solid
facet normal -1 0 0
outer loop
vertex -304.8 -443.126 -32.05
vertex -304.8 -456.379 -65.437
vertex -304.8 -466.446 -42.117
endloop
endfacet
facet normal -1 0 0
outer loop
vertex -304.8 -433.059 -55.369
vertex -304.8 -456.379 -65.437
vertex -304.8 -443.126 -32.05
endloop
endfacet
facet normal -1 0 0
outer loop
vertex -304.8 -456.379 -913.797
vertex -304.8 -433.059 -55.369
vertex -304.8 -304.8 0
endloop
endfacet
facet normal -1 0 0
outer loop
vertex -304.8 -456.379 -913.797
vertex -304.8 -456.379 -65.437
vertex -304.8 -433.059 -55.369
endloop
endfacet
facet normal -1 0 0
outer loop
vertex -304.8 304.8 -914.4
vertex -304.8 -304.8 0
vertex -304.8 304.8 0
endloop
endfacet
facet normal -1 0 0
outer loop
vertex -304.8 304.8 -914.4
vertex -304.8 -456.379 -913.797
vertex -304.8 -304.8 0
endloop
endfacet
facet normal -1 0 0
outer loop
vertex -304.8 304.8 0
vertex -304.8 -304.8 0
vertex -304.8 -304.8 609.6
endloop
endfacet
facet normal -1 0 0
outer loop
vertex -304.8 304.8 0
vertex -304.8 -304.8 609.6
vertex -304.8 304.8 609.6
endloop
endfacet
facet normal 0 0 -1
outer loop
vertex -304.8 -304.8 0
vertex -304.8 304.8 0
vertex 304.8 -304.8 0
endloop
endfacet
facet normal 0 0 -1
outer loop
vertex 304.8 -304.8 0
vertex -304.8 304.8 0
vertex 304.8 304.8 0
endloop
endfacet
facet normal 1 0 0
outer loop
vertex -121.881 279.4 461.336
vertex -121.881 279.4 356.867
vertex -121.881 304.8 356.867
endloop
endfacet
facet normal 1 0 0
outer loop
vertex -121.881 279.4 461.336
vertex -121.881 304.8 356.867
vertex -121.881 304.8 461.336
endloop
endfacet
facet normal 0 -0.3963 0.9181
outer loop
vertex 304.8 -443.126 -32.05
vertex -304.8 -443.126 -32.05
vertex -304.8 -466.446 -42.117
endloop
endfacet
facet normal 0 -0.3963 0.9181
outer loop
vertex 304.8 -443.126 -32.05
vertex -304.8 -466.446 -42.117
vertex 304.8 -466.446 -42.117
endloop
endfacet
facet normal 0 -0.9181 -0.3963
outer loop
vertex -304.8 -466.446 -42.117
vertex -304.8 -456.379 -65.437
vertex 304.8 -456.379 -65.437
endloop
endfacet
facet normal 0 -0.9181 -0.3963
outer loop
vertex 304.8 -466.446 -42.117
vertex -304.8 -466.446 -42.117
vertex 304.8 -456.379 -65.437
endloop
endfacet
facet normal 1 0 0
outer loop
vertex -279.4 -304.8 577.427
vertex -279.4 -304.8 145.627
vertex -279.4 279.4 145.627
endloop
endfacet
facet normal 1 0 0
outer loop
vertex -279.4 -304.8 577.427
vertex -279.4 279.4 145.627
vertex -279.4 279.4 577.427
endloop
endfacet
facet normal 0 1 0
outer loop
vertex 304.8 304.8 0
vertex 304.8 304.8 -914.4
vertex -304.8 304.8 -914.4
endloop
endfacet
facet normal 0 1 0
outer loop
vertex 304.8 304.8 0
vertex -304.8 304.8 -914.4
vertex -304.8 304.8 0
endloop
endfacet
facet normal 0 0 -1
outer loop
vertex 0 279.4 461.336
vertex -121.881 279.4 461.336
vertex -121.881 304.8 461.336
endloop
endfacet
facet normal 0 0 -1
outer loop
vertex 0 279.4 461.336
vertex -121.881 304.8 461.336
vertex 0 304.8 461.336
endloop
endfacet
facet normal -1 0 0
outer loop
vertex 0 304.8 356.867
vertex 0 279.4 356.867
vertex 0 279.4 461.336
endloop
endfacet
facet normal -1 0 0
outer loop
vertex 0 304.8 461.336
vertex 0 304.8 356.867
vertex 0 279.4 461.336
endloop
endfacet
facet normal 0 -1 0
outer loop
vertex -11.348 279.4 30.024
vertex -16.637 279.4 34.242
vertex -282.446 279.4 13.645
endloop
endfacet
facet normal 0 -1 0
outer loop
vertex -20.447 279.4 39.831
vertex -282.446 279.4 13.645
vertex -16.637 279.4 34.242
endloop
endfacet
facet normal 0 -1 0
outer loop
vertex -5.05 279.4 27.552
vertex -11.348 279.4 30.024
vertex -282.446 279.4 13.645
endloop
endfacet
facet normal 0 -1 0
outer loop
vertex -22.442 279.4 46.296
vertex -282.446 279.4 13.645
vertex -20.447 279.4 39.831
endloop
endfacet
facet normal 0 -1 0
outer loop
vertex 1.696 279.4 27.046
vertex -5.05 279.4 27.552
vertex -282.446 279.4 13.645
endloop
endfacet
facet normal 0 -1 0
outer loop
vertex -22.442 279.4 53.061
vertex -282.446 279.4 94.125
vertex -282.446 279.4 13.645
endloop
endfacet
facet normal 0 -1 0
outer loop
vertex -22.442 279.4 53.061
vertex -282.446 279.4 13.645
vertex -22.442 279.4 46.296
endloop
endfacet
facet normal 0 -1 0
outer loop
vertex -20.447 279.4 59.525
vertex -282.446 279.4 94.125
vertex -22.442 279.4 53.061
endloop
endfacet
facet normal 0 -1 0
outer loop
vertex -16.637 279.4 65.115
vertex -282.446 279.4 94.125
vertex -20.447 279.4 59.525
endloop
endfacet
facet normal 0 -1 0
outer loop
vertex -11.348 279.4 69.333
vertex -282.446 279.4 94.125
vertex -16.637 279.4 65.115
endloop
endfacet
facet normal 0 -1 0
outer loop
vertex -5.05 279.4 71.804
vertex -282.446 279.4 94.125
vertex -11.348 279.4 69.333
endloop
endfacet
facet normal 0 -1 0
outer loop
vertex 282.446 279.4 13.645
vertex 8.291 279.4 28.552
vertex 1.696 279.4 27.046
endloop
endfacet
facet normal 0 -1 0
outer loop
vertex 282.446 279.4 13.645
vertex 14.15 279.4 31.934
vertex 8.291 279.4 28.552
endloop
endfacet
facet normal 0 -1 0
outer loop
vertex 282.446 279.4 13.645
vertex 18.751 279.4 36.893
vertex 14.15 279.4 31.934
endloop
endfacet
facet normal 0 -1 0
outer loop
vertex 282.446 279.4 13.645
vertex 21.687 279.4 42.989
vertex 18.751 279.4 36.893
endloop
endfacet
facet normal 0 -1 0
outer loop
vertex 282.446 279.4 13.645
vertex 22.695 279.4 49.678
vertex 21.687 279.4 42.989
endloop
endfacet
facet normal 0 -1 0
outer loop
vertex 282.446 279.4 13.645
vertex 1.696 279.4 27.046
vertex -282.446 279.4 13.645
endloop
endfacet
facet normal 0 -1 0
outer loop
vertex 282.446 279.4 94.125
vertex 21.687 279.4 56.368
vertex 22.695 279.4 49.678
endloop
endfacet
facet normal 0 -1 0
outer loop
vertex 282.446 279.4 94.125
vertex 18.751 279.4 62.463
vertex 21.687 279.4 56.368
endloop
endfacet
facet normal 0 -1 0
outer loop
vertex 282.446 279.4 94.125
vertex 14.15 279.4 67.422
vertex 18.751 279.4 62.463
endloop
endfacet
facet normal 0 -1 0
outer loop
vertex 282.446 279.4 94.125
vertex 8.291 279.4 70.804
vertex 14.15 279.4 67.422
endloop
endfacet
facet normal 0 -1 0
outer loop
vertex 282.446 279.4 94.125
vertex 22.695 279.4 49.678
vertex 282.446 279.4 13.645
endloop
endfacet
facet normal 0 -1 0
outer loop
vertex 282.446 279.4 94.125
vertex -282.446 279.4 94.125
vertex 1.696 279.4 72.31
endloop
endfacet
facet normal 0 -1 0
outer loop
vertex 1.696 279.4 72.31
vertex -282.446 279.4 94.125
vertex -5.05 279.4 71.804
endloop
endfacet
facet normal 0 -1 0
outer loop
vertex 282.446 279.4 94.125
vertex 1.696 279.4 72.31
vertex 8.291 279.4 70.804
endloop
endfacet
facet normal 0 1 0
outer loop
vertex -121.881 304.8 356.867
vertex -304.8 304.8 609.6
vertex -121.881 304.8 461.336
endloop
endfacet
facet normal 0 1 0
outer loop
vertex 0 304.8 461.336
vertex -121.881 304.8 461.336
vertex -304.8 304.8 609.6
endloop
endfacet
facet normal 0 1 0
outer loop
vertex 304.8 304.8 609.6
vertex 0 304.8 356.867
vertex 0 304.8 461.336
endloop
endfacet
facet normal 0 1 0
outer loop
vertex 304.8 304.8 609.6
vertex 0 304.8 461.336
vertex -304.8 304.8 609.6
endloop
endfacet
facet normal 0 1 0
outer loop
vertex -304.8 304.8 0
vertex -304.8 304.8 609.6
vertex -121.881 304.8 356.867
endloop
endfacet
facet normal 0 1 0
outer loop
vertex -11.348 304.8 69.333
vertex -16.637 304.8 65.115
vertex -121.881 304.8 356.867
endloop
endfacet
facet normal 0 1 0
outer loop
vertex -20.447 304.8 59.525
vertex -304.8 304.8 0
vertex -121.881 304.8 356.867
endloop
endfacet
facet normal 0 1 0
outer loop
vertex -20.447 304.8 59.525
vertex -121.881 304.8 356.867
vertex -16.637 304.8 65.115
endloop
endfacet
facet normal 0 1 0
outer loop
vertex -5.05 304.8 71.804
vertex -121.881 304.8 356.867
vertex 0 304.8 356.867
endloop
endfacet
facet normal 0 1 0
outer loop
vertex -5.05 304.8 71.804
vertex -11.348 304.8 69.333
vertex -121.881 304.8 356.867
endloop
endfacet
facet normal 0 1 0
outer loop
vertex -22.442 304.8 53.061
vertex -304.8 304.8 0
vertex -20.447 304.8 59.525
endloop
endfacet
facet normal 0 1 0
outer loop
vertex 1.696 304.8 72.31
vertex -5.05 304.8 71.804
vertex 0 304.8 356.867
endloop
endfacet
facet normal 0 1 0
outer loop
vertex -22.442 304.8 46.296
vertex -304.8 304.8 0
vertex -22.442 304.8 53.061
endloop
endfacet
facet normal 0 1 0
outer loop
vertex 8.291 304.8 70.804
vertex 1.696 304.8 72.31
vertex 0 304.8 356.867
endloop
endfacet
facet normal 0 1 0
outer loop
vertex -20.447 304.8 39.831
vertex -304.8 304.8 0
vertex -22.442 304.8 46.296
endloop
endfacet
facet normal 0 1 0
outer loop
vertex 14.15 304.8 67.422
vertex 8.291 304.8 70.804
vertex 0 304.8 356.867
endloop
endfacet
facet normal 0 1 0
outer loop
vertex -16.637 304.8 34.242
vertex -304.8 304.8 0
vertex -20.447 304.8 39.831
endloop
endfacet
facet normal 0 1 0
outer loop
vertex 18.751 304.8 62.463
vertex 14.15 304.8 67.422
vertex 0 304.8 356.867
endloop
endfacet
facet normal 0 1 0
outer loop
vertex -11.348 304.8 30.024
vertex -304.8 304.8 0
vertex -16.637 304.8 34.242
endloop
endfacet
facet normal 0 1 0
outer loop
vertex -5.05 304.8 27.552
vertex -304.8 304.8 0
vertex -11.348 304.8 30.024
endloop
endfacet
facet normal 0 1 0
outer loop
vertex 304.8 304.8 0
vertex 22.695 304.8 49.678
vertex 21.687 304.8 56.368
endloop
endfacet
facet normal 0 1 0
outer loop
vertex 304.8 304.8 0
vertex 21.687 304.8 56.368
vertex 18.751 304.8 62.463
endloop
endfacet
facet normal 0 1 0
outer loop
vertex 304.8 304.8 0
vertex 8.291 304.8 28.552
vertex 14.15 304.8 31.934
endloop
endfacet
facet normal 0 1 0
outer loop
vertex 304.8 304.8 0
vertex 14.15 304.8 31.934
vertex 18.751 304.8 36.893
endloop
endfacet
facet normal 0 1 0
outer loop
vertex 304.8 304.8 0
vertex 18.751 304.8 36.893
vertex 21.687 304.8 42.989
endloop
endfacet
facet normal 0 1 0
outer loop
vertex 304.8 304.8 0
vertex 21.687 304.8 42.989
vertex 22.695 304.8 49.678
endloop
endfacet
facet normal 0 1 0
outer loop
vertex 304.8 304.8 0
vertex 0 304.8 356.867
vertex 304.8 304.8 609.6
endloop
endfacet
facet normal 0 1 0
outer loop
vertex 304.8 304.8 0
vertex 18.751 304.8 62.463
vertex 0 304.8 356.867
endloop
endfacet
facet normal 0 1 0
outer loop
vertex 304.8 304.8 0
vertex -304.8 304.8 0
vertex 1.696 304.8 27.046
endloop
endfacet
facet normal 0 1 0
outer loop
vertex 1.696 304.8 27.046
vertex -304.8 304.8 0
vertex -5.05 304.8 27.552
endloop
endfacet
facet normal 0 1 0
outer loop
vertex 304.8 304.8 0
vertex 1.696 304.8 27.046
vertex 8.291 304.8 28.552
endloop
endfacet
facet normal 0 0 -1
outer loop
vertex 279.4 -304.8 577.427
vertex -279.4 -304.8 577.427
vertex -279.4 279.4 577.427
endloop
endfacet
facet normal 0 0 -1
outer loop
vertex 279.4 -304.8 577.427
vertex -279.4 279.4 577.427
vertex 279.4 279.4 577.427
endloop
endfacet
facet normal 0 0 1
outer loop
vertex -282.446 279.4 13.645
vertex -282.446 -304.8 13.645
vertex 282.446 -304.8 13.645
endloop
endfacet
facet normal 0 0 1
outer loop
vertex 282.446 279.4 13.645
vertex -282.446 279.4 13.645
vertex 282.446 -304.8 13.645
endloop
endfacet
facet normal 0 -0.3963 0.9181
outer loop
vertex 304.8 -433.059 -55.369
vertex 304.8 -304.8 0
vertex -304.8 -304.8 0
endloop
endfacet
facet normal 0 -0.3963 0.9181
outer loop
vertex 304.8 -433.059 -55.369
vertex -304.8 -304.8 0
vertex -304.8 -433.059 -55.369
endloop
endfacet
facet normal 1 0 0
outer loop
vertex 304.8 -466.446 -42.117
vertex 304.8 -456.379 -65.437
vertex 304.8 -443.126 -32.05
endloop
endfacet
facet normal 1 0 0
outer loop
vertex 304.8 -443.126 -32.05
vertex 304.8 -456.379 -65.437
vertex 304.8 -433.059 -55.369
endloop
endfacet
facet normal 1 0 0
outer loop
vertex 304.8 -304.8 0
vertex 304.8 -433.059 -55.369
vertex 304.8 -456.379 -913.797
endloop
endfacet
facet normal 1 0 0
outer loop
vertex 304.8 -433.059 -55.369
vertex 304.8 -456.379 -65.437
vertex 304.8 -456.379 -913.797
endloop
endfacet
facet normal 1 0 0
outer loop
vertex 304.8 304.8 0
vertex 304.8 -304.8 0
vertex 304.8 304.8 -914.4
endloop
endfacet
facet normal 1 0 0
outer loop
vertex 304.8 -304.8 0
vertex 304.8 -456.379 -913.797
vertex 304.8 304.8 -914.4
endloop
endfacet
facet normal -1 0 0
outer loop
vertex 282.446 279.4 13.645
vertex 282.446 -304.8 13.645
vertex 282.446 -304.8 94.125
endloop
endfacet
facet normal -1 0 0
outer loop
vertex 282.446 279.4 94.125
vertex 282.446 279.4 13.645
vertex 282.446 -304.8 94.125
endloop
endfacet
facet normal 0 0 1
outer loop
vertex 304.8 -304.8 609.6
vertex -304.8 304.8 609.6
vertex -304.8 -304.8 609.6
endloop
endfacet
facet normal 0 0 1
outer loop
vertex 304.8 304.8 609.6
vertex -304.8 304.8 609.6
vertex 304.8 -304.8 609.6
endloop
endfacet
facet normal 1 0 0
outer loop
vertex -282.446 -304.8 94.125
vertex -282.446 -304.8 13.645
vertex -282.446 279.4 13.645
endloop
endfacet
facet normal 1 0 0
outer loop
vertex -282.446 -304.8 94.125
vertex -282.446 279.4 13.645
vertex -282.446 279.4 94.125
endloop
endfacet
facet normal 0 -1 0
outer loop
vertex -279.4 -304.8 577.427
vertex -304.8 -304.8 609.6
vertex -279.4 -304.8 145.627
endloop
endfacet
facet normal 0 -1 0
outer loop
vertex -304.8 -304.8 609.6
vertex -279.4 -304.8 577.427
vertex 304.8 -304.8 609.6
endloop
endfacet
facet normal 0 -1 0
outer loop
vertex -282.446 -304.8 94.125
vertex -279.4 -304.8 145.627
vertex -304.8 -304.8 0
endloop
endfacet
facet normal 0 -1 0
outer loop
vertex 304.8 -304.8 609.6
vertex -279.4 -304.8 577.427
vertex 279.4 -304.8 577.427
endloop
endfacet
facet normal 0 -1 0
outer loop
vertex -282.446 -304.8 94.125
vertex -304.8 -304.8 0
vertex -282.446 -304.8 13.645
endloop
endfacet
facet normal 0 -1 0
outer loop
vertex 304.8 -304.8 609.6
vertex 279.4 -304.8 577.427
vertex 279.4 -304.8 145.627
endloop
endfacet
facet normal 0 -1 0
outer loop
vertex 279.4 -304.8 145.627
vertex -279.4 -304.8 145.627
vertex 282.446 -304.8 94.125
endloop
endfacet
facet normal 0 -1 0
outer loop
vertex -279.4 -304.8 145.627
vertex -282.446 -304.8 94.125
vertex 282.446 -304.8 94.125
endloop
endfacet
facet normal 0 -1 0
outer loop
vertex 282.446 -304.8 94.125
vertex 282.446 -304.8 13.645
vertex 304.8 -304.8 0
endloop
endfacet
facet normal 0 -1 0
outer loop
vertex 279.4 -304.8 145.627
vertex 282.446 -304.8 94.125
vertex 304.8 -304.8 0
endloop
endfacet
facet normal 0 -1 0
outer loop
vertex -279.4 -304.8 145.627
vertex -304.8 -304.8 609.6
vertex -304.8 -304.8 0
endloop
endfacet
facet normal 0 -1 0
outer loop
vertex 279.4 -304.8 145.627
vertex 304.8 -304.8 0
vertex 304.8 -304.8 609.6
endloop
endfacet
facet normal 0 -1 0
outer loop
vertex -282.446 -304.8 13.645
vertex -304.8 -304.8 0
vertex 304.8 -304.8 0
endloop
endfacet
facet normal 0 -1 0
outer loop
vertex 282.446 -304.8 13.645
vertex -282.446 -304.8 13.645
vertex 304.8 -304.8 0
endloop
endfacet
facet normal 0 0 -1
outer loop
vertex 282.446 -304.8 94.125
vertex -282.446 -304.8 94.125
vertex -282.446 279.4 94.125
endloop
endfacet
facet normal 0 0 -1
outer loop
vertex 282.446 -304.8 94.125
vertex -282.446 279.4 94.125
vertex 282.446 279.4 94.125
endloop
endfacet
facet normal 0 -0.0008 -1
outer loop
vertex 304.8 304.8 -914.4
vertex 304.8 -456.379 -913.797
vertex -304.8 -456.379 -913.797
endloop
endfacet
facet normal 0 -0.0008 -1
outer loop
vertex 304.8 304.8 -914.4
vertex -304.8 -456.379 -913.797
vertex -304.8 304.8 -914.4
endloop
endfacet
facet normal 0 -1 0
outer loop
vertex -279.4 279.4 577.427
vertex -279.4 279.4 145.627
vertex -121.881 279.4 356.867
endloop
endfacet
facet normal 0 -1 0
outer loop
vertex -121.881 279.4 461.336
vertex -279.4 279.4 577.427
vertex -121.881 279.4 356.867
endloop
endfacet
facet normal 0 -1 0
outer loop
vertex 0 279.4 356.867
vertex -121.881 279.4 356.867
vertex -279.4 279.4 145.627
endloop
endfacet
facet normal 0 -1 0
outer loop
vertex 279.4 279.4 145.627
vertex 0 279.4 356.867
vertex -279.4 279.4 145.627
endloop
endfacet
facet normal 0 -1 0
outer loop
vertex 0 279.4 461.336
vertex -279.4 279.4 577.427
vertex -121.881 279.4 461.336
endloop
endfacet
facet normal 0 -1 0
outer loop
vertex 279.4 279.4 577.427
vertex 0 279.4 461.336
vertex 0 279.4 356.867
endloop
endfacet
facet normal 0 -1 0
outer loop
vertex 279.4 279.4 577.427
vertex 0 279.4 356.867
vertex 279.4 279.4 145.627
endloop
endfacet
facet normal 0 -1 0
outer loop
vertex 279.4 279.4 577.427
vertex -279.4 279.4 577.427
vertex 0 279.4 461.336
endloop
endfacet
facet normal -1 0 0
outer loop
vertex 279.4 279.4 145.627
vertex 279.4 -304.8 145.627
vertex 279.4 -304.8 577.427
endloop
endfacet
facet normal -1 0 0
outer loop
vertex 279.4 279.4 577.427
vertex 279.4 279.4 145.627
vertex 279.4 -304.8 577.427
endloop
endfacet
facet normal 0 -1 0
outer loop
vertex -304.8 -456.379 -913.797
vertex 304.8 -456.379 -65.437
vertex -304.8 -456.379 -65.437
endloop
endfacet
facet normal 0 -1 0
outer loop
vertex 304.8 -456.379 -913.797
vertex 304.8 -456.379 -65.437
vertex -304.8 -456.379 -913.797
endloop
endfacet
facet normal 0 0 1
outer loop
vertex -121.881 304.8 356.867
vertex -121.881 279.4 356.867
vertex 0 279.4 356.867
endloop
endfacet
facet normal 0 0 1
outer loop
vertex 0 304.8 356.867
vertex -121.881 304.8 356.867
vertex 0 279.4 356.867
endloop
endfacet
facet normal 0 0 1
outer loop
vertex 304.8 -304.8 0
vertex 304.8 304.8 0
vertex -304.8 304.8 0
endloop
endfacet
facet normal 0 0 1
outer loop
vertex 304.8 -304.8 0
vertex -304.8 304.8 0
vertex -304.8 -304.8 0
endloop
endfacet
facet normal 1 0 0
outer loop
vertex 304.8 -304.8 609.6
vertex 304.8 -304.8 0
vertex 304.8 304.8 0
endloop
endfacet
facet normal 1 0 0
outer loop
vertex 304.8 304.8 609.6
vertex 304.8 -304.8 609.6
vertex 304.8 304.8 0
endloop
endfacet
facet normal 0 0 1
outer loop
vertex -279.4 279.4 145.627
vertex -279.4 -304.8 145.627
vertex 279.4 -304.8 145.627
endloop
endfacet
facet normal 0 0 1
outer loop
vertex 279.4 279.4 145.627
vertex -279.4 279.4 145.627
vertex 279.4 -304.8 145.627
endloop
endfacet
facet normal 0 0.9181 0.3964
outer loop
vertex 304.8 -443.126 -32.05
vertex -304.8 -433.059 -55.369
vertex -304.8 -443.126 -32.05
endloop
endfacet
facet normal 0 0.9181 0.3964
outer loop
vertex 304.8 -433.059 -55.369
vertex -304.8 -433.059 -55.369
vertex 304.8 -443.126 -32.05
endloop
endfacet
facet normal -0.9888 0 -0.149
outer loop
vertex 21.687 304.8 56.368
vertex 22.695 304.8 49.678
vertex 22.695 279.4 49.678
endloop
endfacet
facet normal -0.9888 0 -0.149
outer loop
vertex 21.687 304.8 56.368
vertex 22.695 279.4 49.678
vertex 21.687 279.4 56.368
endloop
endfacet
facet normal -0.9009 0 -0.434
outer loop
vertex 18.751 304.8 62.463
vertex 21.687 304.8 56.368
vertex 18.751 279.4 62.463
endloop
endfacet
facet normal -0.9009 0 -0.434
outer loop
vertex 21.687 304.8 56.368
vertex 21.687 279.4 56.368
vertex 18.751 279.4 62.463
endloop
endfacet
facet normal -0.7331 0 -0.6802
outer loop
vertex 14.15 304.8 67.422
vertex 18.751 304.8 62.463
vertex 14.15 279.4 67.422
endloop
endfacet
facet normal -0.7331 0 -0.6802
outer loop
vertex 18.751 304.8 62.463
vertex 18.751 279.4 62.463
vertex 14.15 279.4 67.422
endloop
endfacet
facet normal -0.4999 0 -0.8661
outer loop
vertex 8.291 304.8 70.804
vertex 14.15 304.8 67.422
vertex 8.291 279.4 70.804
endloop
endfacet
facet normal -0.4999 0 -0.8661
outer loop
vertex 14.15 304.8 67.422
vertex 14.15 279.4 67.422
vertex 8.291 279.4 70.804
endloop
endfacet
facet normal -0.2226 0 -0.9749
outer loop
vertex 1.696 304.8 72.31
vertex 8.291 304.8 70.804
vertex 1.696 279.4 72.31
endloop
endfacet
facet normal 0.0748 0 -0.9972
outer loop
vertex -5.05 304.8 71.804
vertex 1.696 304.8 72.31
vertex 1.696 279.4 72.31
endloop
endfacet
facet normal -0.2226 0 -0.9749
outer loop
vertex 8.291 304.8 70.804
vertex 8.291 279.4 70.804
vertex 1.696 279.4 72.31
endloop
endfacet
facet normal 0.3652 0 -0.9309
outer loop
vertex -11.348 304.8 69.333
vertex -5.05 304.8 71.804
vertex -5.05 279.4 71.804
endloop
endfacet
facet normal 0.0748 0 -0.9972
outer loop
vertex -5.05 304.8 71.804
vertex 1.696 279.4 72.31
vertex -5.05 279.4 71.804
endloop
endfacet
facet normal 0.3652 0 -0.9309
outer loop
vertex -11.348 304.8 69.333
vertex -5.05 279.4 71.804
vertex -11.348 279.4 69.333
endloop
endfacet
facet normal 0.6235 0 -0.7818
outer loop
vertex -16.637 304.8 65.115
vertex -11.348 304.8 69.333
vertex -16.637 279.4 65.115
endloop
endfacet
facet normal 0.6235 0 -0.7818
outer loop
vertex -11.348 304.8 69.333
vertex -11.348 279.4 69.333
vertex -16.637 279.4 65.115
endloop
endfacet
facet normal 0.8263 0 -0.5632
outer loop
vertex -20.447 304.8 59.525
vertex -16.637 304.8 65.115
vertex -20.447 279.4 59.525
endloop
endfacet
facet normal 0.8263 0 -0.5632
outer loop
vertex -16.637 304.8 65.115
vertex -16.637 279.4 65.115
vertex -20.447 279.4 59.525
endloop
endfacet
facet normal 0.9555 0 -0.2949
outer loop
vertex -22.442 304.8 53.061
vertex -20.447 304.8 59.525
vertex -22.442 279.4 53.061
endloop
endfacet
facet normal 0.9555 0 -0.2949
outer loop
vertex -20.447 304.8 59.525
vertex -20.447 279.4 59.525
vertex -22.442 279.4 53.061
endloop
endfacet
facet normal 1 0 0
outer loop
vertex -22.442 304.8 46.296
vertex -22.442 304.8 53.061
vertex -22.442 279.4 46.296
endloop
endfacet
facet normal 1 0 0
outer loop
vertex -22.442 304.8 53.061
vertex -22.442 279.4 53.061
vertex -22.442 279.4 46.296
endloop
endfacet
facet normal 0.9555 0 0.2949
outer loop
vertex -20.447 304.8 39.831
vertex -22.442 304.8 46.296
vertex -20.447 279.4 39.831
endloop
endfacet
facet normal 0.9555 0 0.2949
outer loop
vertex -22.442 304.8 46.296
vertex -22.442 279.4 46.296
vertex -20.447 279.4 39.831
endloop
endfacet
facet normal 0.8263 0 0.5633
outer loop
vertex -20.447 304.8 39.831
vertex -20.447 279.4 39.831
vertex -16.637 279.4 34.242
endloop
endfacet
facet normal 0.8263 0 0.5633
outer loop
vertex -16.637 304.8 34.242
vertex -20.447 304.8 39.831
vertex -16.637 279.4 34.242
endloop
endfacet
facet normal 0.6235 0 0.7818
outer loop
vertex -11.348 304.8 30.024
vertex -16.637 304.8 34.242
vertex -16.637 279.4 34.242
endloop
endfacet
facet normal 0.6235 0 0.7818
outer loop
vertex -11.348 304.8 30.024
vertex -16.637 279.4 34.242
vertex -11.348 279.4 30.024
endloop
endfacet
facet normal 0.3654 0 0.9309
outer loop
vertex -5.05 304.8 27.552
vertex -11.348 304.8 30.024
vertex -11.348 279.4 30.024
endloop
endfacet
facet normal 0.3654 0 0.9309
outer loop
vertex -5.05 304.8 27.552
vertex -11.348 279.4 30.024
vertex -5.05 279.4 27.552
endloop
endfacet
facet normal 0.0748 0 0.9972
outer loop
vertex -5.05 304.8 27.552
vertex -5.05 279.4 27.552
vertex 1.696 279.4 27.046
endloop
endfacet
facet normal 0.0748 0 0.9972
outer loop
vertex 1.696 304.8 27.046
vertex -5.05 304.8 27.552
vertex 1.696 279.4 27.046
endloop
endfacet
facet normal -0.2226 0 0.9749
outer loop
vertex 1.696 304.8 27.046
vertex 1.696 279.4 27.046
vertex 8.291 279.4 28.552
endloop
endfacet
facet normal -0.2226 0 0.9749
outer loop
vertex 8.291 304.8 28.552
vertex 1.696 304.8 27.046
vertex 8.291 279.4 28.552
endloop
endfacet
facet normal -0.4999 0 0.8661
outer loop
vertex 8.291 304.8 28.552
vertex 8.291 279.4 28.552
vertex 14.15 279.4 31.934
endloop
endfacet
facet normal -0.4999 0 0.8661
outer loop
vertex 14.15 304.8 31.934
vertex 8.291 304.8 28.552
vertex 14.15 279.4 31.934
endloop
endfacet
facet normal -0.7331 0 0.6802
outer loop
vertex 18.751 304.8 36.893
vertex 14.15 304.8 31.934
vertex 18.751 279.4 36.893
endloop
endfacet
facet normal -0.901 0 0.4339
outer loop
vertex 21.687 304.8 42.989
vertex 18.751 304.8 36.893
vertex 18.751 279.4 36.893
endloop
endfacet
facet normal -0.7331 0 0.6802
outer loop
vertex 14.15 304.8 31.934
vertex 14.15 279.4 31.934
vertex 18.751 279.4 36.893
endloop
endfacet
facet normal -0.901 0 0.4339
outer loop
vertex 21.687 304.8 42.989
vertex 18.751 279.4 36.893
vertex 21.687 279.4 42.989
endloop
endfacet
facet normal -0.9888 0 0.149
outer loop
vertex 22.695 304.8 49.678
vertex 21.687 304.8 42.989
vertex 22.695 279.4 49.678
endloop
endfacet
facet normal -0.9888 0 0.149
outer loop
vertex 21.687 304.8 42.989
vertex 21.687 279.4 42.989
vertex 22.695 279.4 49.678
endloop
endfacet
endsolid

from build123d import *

# Parameters (mm, degrees)
F0_W      = 609.6
F0_H      = 609.6
F1_DEPTH  = 609.6
F2_W      = 558.8
F2_H      = 431.8
F2_W_2    = 564.8918747902
F2_H_2    = 80.4801862687
F3_DEPTH  = 584.2
F4_W      = 121.8805164099
F4_H      = 104.4690310955
F5_DEPTH  = 25.4
F4_R      = 22.6950102974
F6_DEPTH  = 25.4
F8_DEPTH  = 609.6
F9_W      = 609.6
F9_H      = 25.4
F10_DEPTH = 25.4


with BuildPart() as f1:
    # F0 (on Top) → F1 (new body)
    with BuildSketch(Plane.XY):
        Rectangle(F0_W, F0_H)
    extrude(amount=F1_DEPTH)

    # F2 (on face) → F3 (cut)
    with BuildSketch(Plane.XZ.offset(304.8)):
        with Locations((0, 361.5269362926)):
            Rectangle(F2_W, F2_H)
        with Locations((0, 53.8849085569)):
            Rectangle(F2_W_2, F2_H_2)
    extrude(amount=-F3_DEPTH, mode=Mode.SUBTRACT)

    # F4 (on face) → F5 (cut)
    with BuildSketch(Plane.XZ.offset(-279.4)):
        with Locations((-60.9402582049, 409.1012328863)):
            Rectangle(F4_W, F4_H)
    extrude(amount=-F5_DEPTH, mode=Mode.SUBTRACT)

    # F4 (on face) → F6 (cut)
    with BuildSketch(Plane.XZ.offset(-279.4)):
        with Locations((-60.9402582049, 409.1012328863)):
            Rectangle(F4_W, F4_H)
        with Locations((0, 49.6780462563)):
            Circle(F4_R)
    extrude(amount=-F6_DEPTH, mode=Mode.SUBTRACT)


with BuildPart() as f8:
    # F7 (on face) → F8 (new body)
    with BuildSketch(Plane.YZ.offset(304.8)):
        Polygon((304.8, 0), (-304.8, 0), (-456.3785592522, -65.4366134135), (-456.3785592522, -913.7966134135), (304.8, -914.4), align=None)
    extrude(amount=-F8_DEPTH)

    # F9 (on face) → F10 (join)
    with BuildSketch(Plane(origin=(0, -47.8809155294, 110.912221966), x_dir=(1, 0, 0), z_dir=(0, -0.3963453266, 0.9181015097))):
        with Locations((0, -432.2373401579)):
            Rectangle(F9_W, F9_H)
    extrude(amount=F10_DEPTH)


solid = Compound([f1.part, f8.part])
